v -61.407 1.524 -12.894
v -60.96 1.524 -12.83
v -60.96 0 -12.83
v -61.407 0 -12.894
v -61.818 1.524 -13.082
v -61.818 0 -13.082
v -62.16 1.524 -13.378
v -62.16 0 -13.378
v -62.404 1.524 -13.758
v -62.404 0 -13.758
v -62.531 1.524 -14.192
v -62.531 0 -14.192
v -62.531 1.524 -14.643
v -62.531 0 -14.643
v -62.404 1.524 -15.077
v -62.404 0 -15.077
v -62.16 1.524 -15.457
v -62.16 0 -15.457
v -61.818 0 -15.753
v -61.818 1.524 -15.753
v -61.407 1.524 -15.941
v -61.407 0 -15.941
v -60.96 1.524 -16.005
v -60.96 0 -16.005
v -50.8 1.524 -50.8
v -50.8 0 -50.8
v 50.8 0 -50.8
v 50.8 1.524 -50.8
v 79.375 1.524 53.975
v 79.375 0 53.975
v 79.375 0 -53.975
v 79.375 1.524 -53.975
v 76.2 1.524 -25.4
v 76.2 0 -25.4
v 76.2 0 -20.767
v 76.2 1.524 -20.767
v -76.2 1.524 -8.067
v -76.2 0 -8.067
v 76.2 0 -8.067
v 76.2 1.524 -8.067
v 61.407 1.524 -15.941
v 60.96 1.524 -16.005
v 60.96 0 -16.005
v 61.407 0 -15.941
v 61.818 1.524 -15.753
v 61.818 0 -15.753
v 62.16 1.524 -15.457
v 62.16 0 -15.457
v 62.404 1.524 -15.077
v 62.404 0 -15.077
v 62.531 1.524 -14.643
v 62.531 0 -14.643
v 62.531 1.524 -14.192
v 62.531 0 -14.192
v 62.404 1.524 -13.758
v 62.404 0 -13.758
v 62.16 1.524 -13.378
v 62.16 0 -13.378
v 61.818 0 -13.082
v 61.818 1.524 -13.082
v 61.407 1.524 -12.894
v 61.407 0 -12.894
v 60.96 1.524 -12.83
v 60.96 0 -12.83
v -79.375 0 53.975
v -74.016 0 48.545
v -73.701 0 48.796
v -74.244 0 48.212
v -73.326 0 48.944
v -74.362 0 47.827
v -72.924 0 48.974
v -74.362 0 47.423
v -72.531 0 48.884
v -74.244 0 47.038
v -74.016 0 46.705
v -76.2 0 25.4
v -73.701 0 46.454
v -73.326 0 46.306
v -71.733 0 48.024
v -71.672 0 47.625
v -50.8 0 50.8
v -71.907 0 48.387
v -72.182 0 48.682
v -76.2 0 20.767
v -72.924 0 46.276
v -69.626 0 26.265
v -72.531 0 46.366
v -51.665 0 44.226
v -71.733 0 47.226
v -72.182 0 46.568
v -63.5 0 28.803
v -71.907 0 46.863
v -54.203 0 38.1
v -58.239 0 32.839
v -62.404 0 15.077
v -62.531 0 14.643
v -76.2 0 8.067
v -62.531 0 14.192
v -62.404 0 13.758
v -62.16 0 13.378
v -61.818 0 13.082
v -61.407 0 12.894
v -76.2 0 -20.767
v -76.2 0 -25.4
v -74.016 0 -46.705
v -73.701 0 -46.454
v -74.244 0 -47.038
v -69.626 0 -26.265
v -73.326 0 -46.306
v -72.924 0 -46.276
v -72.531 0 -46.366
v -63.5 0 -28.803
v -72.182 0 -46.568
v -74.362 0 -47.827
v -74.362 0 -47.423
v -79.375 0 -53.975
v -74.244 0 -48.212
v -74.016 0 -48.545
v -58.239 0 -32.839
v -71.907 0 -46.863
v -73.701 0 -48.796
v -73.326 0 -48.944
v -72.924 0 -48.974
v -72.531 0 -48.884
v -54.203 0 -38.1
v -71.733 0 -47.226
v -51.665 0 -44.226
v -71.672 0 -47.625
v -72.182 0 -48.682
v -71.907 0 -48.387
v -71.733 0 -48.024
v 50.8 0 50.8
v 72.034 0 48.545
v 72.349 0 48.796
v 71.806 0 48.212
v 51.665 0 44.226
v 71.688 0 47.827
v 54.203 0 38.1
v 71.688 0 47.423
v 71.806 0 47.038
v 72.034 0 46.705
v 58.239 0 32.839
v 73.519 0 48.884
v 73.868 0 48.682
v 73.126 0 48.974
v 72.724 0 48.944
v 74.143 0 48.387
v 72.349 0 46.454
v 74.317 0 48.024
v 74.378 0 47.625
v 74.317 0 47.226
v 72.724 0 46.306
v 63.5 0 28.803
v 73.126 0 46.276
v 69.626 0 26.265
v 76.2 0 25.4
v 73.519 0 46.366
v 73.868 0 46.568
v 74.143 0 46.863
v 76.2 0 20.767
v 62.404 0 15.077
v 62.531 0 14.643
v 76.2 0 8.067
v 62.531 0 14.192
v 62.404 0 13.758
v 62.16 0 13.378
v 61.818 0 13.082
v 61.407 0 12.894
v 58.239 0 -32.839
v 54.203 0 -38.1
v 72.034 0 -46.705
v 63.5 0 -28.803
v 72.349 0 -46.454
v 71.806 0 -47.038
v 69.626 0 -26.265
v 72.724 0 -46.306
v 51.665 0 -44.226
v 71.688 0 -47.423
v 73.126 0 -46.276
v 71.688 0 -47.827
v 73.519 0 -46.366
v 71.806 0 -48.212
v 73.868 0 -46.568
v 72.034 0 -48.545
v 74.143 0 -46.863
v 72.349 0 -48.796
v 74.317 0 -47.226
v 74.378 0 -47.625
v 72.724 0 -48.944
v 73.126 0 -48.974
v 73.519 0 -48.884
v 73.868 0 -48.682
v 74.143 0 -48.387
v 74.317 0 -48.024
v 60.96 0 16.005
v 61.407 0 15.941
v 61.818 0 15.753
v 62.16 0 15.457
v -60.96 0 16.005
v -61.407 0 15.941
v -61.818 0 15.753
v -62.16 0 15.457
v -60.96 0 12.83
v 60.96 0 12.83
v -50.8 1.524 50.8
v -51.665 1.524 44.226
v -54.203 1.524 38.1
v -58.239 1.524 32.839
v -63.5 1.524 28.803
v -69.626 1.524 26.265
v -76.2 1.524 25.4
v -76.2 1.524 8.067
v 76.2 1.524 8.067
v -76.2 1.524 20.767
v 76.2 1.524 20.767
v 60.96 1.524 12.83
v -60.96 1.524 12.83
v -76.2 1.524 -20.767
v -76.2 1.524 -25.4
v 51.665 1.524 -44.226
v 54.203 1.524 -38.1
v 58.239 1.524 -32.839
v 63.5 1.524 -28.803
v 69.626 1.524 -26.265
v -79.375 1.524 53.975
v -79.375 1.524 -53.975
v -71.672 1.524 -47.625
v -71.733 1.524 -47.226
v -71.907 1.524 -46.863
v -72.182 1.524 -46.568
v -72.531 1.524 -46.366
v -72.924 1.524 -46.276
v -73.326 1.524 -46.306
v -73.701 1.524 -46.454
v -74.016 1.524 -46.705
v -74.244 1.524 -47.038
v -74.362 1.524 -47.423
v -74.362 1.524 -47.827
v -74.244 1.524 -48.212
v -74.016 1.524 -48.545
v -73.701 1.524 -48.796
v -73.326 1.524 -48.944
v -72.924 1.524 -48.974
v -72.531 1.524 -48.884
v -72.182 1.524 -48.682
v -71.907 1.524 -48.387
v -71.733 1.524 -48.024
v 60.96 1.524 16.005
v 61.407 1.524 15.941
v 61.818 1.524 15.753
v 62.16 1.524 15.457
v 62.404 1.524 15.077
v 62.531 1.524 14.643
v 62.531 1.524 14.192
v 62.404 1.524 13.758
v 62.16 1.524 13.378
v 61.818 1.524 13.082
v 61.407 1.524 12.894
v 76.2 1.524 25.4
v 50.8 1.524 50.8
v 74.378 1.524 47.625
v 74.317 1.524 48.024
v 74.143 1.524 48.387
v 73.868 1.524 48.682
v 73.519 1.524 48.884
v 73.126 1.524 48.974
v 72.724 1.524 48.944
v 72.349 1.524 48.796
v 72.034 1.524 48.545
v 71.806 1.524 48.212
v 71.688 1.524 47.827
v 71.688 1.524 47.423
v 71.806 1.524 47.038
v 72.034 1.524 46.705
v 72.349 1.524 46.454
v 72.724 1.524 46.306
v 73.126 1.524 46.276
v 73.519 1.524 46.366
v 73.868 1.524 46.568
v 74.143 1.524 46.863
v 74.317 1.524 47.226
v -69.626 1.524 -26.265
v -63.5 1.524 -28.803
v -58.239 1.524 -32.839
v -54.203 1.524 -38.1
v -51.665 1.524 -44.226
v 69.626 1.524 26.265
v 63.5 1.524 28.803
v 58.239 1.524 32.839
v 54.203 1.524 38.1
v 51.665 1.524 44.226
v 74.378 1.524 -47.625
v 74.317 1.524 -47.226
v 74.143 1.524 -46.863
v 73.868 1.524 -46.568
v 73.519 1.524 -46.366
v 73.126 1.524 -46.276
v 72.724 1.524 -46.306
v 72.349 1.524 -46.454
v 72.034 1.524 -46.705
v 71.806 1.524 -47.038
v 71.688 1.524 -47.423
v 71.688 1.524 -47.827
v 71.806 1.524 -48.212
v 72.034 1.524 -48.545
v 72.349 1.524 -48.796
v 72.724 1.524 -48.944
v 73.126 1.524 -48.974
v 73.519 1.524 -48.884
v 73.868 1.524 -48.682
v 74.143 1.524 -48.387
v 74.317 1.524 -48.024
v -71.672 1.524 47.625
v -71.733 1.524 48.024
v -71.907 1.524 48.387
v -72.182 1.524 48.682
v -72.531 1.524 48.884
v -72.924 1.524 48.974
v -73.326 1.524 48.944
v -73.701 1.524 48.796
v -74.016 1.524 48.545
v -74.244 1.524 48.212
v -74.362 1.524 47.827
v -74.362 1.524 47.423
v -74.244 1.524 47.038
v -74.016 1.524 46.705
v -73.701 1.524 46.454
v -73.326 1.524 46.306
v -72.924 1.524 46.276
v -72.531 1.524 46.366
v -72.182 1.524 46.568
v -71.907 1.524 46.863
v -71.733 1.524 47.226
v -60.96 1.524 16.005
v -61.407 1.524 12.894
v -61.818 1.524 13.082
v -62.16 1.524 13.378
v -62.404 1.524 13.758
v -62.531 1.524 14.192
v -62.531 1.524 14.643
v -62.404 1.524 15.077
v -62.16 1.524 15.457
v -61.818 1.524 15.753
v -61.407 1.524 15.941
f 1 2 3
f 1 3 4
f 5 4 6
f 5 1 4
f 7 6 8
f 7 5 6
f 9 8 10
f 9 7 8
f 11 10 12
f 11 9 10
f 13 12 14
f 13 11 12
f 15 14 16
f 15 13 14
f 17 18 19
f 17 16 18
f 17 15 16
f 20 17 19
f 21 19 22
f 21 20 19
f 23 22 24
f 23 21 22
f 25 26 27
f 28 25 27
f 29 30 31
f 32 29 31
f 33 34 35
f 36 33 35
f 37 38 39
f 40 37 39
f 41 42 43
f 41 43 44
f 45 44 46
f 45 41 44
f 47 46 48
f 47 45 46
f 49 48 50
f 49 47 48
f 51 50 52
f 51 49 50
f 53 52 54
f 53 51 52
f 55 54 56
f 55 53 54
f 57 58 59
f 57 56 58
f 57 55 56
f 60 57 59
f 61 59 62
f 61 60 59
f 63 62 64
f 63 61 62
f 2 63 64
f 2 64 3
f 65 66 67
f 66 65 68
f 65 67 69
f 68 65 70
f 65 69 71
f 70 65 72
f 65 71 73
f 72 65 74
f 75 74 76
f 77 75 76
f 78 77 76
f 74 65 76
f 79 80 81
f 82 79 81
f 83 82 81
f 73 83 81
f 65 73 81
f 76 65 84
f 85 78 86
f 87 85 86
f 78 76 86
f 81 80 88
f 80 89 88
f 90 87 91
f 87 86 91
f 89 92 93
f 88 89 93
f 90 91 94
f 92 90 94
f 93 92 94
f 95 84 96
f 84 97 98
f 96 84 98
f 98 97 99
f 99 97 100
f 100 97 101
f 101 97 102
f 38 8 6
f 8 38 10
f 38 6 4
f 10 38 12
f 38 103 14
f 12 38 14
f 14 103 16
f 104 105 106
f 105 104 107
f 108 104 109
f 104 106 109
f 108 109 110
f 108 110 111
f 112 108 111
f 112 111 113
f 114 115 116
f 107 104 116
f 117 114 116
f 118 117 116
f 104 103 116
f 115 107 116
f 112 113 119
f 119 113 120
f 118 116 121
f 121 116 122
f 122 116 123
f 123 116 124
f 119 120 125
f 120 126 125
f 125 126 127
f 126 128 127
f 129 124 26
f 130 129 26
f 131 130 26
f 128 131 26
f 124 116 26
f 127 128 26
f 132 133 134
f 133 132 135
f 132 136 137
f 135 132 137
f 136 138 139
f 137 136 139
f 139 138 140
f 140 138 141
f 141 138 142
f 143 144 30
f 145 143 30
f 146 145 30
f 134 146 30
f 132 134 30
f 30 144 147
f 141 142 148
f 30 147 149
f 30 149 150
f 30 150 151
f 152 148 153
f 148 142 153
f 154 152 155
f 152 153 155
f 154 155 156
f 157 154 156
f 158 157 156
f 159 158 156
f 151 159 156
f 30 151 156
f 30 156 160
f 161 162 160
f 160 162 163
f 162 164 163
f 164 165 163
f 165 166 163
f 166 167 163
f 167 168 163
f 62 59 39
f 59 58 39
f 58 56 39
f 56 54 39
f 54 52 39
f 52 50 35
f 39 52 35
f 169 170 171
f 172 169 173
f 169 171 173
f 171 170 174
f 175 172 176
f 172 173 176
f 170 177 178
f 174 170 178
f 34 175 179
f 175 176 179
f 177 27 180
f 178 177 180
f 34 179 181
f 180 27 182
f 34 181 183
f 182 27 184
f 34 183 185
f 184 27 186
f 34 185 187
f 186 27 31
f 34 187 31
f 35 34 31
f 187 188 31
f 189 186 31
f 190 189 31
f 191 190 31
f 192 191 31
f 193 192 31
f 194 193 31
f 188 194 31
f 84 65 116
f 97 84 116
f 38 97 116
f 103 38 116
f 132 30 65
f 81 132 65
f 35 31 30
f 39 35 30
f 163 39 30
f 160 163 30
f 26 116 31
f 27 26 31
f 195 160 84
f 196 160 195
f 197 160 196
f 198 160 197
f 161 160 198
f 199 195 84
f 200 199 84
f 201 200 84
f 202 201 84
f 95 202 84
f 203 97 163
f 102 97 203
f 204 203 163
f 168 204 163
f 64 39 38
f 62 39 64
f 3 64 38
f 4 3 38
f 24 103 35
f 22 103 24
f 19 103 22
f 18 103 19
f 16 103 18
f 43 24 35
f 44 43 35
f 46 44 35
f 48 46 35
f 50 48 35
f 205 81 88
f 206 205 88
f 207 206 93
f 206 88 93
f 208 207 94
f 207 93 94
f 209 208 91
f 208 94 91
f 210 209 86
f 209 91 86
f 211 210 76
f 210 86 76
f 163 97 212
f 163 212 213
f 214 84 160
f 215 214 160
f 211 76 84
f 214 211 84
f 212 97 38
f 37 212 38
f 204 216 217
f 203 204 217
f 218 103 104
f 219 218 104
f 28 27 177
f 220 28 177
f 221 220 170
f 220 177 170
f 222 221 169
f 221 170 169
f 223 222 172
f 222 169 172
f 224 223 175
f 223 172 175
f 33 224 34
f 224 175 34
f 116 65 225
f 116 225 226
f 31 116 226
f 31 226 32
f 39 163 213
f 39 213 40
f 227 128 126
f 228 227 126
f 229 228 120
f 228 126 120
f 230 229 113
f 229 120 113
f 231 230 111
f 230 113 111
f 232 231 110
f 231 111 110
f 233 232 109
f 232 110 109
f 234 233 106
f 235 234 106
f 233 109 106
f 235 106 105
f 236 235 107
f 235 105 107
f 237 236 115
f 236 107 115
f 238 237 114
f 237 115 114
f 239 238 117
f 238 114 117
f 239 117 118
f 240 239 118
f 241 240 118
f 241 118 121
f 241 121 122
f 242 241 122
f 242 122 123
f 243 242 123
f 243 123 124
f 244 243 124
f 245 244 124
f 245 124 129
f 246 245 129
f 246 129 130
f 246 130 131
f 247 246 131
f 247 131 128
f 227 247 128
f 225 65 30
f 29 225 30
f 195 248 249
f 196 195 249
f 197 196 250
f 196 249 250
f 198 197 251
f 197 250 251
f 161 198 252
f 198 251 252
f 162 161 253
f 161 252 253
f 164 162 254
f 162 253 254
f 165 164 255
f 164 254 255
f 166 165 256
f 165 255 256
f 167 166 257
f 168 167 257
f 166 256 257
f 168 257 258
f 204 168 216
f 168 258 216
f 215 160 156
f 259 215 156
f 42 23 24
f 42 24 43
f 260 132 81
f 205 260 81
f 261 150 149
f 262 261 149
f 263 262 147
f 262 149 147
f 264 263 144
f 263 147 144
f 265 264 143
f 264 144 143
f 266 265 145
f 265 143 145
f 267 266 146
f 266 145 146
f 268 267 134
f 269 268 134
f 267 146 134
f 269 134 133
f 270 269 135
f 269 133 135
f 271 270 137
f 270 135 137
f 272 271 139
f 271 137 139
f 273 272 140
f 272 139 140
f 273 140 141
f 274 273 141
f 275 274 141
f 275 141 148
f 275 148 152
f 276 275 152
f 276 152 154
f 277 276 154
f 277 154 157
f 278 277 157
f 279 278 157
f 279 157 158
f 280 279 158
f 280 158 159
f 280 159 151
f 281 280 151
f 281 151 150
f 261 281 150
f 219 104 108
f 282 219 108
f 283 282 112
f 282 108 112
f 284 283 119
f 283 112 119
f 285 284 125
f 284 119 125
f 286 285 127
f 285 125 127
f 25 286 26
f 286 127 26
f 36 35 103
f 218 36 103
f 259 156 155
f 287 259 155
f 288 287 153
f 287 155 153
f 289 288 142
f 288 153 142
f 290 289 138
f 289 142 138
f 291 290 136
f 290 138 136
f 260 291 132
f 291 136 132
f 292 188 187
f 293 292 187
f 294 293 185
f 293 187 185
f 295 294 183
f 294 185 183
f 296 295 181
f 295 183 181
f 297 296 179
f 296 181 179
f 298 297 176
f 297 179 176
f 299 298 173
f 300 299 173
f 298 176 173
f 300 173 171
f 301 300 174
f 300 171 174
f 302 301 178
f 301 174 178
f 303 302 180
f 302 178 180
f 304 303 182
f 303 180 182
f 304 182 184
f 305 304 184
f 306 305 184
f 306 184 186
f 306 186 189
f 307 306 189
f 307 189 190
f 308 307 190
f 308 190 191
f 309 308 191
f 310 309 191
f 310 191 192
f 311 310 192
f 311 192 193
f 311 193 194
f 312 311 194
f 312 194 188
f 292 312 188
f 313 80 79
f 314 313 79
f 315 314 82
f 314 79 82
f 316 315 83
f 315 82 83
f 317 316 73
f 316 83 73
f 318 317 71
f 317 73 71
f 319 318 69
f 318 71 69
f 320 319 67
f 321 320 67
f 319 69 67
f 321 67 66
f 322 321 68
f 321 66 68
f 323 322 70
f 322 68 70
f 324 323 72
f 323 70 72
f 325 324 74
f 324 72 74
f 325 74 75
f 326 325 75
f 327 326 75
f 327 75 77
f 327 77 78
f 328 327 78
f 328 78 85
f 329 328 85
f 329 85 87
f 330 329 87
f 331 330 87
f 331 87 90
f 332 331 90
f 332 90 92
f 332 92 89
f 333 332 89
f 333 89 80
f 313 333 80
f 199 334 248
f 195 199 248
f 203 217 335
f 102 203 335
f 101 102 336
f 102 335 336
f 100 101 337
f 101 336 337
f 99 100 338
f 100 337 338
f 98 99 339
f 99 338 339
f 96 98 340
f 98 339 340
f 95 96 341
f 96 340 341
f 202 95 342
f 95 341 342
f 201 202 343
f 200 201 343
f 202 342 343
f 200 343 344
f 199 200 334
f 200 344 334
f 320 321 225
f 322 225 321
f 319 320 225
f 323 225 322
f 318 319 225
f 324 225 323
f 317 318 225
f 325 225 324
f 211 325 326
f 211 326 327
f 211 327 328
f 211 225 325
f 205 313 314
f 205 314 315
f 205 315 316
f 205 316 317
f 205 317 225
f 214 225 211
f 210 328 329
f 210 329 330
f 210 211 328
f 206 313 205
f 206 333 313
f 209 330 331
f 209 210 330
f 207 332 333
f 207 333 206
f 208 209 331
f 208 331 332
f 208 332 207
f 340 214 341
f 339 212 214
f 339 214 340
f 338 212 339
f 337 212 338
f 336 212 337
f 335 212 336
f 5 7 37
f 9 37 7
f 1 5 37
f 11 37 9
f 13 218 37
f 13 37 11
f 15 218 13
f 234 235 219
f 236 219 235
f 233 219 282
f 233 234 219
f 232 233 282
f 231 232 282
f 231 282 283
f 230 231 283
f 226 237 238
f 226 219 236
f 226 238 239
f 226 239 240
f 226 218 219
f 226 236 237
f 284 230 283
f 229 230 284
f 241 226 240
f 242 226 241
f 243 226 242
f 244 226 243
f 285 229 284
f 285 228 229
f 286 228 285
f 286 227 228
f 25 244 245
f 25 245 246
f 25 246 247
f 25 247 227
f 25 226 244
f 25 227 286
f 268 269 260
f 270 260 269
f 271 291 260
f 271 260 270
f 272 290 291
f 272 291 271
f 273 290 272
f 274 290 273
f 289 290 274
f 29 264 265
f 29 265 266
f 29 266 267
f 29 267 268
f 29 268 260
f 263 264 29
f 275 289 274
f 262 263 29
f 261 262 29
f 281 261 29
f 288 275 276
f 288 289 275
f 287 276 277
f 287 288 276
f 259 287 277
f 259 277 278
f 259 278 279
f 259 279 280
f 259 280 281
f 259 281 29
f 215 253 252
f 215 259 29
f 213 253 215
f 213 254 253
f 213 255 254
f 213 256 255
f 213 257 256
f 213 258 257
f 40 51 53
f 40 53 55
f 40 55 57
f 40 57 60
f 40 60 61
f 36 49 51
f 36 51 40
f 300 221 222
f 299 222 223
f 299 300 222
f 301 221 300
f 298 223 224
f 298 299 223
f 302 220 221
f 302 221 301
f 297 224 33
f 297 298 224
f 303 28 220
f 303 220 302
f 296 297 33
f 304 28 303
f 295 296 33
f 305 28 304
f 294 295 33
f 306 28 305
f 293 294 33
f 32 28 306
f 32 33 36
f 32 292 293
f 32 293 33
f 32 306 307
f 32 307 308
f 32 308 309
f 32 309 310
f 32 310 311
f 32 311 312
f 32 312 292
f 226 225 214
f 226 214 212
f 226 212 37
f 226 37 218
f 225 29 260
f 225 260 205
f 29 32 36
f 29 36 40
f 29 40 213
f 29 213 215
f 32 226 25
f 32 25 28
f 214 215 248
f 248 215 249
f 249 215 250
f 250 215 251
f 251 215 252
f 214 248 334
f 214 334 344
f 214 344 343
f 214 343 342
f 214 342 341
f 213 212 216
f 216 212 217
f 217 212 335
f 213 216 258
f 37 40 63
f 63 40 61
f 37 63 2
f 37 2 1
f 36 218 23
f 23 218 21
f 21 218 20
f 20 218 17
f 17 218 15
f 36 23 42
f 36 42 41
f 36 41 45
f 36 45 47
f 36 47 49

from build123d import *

# Parameters (mm, degrees)
SKETCH1_W             = 158.75
SKETCH1_H             = 107.95
SKETCH1_W_2           = 152.4
SKETCH1_H_2           = 16.134929366
BOSS_EXTRUDE1_DEPTH   = 1.524
CUT_EXTRUDE1_DEPTH    = 2.524
F_6_32_TAPPED_HOLE1_D = 2.7051
F_6_32_TAPPED_HOLE2_D = 2.7051


with BuildPart() as part:
    # Sketch1 → Boss-Extrude1 (new body)
    with BuildSketch(Plane(origin=(0, 0, 0), x_dir=(1, 0, 0), z_dir=(0, 1, 0))):
        Rectangle(SKETCH1_W, SKETCH1_H)
        with BuildLine():
            Line((-76.2, -25.4), (-76.2, -20.767464683))
            Line((-76.2, -20.767464683), (76.2, -20.767464683))
            Line((76.2, -20.767464683), (76.2, -25.4))
            ThreePointArc((76.2, -25.4), (58.239487758, -32.839487758), (50.8, -50.8))
            Line((50.8, -50.8), (-50.8, -50.8))
            ThreePointArc((-50.8, -50.8), (-58.239487758, -32.839487758), (-76.2, -25.4))
        make_face(mode=Mode.SUBTRACT)
        Rectangle(SKETCH1_W_2, SKETCH1_H_2, mode=Mode.SUBTRACT)
        with BuildLine():
            Line((76.2, 20.767464683), (-76.2, 20.767464683))
            Line((-76.2, 20.767464683), (-76.2, 25.4))
            ThreePointArc((-76.2, 25.4), (-58.239487758, 32.839487758), (-50.8, 50.8))
            Line((-50.8, 50.8), (50.8, 50.8))
            ThreePointArc((50.8, 50.8), (58.239487758, 32.839487758), (76.2, 25.4))
            Line((76.2, 25.4), (76.2, 20.767464683))
        make_face(mode=Mode.SUBTRACT)
    extrude(amount=BOSS_EXTRUDE1_DEPTH)

    # Sketch3 → Cut-Extrude1 (cut, through all)
    with BuildSketch(Plane(origin=(0, 1.524, 0), x_dir=(1, 0, 0), z_dir=(0, 1, 0))):
        with BuildLine():
            Line((-60.96, 16.004964683), (60.96, 16.004964683))
            ThreePointArc((60.96, 16.004964683), (62.5475, 14.417464683), (60.96, 12.829964683))
            Line((60.96, 12.829964683), (-60.96, 12.829964683))
            ThreePointArc((-60.96, 12.829964683), (-62.5475, 14.417464683), (-60.96, 16.004964683))
        make_face()
        with BuildLine():
            Line((-60.96, -16.004964683), (60.96, -16.004964683))
            ThreePointArc((60.96, -16.004964683), (62.5475, -14.417464683), (60.96, -12.829964683))
            Line((60.96, -12.829964683), (-60.96, -12.829964683))
            ThreePointArc((-60.96, -12.829964683), (-62.5475, -14.417464683), (-60.96, -16.004964683))
        make_face()
    extrude(amount=-CUT_EXTRUDE1_DEPTH, mode=Mode.SUBTRACT)

    # #6-32 Tapped Hole1 (through all)
    with Locations(Plane(origin=(0, 7.8105, 0), x_dir=(-1, 0, 0), z_dir=(0, 1, 0))):
        with Locations((73.025, -47.625), (73.025, 47.625), (-73.025, 47.625), (-73.025, -47.625)):
            Hole(F_6_32_TAPPED_HOLE1_D / 2)

    # #6-32 Tapped Hole2 (through all)
    with Locations(Plane(origin=(0, 1.524, 0), x_dir=(-1, 0, 0), z_dir=(0, 1, 0))):
        with Locations((73.025, -47.625), (73.025, 47.625), (-73.025, 47.625), (-73.025, -47.625)):
            Hole(F_6_32_TAPPED_HOLE2_D / 2)


solid = part.part
